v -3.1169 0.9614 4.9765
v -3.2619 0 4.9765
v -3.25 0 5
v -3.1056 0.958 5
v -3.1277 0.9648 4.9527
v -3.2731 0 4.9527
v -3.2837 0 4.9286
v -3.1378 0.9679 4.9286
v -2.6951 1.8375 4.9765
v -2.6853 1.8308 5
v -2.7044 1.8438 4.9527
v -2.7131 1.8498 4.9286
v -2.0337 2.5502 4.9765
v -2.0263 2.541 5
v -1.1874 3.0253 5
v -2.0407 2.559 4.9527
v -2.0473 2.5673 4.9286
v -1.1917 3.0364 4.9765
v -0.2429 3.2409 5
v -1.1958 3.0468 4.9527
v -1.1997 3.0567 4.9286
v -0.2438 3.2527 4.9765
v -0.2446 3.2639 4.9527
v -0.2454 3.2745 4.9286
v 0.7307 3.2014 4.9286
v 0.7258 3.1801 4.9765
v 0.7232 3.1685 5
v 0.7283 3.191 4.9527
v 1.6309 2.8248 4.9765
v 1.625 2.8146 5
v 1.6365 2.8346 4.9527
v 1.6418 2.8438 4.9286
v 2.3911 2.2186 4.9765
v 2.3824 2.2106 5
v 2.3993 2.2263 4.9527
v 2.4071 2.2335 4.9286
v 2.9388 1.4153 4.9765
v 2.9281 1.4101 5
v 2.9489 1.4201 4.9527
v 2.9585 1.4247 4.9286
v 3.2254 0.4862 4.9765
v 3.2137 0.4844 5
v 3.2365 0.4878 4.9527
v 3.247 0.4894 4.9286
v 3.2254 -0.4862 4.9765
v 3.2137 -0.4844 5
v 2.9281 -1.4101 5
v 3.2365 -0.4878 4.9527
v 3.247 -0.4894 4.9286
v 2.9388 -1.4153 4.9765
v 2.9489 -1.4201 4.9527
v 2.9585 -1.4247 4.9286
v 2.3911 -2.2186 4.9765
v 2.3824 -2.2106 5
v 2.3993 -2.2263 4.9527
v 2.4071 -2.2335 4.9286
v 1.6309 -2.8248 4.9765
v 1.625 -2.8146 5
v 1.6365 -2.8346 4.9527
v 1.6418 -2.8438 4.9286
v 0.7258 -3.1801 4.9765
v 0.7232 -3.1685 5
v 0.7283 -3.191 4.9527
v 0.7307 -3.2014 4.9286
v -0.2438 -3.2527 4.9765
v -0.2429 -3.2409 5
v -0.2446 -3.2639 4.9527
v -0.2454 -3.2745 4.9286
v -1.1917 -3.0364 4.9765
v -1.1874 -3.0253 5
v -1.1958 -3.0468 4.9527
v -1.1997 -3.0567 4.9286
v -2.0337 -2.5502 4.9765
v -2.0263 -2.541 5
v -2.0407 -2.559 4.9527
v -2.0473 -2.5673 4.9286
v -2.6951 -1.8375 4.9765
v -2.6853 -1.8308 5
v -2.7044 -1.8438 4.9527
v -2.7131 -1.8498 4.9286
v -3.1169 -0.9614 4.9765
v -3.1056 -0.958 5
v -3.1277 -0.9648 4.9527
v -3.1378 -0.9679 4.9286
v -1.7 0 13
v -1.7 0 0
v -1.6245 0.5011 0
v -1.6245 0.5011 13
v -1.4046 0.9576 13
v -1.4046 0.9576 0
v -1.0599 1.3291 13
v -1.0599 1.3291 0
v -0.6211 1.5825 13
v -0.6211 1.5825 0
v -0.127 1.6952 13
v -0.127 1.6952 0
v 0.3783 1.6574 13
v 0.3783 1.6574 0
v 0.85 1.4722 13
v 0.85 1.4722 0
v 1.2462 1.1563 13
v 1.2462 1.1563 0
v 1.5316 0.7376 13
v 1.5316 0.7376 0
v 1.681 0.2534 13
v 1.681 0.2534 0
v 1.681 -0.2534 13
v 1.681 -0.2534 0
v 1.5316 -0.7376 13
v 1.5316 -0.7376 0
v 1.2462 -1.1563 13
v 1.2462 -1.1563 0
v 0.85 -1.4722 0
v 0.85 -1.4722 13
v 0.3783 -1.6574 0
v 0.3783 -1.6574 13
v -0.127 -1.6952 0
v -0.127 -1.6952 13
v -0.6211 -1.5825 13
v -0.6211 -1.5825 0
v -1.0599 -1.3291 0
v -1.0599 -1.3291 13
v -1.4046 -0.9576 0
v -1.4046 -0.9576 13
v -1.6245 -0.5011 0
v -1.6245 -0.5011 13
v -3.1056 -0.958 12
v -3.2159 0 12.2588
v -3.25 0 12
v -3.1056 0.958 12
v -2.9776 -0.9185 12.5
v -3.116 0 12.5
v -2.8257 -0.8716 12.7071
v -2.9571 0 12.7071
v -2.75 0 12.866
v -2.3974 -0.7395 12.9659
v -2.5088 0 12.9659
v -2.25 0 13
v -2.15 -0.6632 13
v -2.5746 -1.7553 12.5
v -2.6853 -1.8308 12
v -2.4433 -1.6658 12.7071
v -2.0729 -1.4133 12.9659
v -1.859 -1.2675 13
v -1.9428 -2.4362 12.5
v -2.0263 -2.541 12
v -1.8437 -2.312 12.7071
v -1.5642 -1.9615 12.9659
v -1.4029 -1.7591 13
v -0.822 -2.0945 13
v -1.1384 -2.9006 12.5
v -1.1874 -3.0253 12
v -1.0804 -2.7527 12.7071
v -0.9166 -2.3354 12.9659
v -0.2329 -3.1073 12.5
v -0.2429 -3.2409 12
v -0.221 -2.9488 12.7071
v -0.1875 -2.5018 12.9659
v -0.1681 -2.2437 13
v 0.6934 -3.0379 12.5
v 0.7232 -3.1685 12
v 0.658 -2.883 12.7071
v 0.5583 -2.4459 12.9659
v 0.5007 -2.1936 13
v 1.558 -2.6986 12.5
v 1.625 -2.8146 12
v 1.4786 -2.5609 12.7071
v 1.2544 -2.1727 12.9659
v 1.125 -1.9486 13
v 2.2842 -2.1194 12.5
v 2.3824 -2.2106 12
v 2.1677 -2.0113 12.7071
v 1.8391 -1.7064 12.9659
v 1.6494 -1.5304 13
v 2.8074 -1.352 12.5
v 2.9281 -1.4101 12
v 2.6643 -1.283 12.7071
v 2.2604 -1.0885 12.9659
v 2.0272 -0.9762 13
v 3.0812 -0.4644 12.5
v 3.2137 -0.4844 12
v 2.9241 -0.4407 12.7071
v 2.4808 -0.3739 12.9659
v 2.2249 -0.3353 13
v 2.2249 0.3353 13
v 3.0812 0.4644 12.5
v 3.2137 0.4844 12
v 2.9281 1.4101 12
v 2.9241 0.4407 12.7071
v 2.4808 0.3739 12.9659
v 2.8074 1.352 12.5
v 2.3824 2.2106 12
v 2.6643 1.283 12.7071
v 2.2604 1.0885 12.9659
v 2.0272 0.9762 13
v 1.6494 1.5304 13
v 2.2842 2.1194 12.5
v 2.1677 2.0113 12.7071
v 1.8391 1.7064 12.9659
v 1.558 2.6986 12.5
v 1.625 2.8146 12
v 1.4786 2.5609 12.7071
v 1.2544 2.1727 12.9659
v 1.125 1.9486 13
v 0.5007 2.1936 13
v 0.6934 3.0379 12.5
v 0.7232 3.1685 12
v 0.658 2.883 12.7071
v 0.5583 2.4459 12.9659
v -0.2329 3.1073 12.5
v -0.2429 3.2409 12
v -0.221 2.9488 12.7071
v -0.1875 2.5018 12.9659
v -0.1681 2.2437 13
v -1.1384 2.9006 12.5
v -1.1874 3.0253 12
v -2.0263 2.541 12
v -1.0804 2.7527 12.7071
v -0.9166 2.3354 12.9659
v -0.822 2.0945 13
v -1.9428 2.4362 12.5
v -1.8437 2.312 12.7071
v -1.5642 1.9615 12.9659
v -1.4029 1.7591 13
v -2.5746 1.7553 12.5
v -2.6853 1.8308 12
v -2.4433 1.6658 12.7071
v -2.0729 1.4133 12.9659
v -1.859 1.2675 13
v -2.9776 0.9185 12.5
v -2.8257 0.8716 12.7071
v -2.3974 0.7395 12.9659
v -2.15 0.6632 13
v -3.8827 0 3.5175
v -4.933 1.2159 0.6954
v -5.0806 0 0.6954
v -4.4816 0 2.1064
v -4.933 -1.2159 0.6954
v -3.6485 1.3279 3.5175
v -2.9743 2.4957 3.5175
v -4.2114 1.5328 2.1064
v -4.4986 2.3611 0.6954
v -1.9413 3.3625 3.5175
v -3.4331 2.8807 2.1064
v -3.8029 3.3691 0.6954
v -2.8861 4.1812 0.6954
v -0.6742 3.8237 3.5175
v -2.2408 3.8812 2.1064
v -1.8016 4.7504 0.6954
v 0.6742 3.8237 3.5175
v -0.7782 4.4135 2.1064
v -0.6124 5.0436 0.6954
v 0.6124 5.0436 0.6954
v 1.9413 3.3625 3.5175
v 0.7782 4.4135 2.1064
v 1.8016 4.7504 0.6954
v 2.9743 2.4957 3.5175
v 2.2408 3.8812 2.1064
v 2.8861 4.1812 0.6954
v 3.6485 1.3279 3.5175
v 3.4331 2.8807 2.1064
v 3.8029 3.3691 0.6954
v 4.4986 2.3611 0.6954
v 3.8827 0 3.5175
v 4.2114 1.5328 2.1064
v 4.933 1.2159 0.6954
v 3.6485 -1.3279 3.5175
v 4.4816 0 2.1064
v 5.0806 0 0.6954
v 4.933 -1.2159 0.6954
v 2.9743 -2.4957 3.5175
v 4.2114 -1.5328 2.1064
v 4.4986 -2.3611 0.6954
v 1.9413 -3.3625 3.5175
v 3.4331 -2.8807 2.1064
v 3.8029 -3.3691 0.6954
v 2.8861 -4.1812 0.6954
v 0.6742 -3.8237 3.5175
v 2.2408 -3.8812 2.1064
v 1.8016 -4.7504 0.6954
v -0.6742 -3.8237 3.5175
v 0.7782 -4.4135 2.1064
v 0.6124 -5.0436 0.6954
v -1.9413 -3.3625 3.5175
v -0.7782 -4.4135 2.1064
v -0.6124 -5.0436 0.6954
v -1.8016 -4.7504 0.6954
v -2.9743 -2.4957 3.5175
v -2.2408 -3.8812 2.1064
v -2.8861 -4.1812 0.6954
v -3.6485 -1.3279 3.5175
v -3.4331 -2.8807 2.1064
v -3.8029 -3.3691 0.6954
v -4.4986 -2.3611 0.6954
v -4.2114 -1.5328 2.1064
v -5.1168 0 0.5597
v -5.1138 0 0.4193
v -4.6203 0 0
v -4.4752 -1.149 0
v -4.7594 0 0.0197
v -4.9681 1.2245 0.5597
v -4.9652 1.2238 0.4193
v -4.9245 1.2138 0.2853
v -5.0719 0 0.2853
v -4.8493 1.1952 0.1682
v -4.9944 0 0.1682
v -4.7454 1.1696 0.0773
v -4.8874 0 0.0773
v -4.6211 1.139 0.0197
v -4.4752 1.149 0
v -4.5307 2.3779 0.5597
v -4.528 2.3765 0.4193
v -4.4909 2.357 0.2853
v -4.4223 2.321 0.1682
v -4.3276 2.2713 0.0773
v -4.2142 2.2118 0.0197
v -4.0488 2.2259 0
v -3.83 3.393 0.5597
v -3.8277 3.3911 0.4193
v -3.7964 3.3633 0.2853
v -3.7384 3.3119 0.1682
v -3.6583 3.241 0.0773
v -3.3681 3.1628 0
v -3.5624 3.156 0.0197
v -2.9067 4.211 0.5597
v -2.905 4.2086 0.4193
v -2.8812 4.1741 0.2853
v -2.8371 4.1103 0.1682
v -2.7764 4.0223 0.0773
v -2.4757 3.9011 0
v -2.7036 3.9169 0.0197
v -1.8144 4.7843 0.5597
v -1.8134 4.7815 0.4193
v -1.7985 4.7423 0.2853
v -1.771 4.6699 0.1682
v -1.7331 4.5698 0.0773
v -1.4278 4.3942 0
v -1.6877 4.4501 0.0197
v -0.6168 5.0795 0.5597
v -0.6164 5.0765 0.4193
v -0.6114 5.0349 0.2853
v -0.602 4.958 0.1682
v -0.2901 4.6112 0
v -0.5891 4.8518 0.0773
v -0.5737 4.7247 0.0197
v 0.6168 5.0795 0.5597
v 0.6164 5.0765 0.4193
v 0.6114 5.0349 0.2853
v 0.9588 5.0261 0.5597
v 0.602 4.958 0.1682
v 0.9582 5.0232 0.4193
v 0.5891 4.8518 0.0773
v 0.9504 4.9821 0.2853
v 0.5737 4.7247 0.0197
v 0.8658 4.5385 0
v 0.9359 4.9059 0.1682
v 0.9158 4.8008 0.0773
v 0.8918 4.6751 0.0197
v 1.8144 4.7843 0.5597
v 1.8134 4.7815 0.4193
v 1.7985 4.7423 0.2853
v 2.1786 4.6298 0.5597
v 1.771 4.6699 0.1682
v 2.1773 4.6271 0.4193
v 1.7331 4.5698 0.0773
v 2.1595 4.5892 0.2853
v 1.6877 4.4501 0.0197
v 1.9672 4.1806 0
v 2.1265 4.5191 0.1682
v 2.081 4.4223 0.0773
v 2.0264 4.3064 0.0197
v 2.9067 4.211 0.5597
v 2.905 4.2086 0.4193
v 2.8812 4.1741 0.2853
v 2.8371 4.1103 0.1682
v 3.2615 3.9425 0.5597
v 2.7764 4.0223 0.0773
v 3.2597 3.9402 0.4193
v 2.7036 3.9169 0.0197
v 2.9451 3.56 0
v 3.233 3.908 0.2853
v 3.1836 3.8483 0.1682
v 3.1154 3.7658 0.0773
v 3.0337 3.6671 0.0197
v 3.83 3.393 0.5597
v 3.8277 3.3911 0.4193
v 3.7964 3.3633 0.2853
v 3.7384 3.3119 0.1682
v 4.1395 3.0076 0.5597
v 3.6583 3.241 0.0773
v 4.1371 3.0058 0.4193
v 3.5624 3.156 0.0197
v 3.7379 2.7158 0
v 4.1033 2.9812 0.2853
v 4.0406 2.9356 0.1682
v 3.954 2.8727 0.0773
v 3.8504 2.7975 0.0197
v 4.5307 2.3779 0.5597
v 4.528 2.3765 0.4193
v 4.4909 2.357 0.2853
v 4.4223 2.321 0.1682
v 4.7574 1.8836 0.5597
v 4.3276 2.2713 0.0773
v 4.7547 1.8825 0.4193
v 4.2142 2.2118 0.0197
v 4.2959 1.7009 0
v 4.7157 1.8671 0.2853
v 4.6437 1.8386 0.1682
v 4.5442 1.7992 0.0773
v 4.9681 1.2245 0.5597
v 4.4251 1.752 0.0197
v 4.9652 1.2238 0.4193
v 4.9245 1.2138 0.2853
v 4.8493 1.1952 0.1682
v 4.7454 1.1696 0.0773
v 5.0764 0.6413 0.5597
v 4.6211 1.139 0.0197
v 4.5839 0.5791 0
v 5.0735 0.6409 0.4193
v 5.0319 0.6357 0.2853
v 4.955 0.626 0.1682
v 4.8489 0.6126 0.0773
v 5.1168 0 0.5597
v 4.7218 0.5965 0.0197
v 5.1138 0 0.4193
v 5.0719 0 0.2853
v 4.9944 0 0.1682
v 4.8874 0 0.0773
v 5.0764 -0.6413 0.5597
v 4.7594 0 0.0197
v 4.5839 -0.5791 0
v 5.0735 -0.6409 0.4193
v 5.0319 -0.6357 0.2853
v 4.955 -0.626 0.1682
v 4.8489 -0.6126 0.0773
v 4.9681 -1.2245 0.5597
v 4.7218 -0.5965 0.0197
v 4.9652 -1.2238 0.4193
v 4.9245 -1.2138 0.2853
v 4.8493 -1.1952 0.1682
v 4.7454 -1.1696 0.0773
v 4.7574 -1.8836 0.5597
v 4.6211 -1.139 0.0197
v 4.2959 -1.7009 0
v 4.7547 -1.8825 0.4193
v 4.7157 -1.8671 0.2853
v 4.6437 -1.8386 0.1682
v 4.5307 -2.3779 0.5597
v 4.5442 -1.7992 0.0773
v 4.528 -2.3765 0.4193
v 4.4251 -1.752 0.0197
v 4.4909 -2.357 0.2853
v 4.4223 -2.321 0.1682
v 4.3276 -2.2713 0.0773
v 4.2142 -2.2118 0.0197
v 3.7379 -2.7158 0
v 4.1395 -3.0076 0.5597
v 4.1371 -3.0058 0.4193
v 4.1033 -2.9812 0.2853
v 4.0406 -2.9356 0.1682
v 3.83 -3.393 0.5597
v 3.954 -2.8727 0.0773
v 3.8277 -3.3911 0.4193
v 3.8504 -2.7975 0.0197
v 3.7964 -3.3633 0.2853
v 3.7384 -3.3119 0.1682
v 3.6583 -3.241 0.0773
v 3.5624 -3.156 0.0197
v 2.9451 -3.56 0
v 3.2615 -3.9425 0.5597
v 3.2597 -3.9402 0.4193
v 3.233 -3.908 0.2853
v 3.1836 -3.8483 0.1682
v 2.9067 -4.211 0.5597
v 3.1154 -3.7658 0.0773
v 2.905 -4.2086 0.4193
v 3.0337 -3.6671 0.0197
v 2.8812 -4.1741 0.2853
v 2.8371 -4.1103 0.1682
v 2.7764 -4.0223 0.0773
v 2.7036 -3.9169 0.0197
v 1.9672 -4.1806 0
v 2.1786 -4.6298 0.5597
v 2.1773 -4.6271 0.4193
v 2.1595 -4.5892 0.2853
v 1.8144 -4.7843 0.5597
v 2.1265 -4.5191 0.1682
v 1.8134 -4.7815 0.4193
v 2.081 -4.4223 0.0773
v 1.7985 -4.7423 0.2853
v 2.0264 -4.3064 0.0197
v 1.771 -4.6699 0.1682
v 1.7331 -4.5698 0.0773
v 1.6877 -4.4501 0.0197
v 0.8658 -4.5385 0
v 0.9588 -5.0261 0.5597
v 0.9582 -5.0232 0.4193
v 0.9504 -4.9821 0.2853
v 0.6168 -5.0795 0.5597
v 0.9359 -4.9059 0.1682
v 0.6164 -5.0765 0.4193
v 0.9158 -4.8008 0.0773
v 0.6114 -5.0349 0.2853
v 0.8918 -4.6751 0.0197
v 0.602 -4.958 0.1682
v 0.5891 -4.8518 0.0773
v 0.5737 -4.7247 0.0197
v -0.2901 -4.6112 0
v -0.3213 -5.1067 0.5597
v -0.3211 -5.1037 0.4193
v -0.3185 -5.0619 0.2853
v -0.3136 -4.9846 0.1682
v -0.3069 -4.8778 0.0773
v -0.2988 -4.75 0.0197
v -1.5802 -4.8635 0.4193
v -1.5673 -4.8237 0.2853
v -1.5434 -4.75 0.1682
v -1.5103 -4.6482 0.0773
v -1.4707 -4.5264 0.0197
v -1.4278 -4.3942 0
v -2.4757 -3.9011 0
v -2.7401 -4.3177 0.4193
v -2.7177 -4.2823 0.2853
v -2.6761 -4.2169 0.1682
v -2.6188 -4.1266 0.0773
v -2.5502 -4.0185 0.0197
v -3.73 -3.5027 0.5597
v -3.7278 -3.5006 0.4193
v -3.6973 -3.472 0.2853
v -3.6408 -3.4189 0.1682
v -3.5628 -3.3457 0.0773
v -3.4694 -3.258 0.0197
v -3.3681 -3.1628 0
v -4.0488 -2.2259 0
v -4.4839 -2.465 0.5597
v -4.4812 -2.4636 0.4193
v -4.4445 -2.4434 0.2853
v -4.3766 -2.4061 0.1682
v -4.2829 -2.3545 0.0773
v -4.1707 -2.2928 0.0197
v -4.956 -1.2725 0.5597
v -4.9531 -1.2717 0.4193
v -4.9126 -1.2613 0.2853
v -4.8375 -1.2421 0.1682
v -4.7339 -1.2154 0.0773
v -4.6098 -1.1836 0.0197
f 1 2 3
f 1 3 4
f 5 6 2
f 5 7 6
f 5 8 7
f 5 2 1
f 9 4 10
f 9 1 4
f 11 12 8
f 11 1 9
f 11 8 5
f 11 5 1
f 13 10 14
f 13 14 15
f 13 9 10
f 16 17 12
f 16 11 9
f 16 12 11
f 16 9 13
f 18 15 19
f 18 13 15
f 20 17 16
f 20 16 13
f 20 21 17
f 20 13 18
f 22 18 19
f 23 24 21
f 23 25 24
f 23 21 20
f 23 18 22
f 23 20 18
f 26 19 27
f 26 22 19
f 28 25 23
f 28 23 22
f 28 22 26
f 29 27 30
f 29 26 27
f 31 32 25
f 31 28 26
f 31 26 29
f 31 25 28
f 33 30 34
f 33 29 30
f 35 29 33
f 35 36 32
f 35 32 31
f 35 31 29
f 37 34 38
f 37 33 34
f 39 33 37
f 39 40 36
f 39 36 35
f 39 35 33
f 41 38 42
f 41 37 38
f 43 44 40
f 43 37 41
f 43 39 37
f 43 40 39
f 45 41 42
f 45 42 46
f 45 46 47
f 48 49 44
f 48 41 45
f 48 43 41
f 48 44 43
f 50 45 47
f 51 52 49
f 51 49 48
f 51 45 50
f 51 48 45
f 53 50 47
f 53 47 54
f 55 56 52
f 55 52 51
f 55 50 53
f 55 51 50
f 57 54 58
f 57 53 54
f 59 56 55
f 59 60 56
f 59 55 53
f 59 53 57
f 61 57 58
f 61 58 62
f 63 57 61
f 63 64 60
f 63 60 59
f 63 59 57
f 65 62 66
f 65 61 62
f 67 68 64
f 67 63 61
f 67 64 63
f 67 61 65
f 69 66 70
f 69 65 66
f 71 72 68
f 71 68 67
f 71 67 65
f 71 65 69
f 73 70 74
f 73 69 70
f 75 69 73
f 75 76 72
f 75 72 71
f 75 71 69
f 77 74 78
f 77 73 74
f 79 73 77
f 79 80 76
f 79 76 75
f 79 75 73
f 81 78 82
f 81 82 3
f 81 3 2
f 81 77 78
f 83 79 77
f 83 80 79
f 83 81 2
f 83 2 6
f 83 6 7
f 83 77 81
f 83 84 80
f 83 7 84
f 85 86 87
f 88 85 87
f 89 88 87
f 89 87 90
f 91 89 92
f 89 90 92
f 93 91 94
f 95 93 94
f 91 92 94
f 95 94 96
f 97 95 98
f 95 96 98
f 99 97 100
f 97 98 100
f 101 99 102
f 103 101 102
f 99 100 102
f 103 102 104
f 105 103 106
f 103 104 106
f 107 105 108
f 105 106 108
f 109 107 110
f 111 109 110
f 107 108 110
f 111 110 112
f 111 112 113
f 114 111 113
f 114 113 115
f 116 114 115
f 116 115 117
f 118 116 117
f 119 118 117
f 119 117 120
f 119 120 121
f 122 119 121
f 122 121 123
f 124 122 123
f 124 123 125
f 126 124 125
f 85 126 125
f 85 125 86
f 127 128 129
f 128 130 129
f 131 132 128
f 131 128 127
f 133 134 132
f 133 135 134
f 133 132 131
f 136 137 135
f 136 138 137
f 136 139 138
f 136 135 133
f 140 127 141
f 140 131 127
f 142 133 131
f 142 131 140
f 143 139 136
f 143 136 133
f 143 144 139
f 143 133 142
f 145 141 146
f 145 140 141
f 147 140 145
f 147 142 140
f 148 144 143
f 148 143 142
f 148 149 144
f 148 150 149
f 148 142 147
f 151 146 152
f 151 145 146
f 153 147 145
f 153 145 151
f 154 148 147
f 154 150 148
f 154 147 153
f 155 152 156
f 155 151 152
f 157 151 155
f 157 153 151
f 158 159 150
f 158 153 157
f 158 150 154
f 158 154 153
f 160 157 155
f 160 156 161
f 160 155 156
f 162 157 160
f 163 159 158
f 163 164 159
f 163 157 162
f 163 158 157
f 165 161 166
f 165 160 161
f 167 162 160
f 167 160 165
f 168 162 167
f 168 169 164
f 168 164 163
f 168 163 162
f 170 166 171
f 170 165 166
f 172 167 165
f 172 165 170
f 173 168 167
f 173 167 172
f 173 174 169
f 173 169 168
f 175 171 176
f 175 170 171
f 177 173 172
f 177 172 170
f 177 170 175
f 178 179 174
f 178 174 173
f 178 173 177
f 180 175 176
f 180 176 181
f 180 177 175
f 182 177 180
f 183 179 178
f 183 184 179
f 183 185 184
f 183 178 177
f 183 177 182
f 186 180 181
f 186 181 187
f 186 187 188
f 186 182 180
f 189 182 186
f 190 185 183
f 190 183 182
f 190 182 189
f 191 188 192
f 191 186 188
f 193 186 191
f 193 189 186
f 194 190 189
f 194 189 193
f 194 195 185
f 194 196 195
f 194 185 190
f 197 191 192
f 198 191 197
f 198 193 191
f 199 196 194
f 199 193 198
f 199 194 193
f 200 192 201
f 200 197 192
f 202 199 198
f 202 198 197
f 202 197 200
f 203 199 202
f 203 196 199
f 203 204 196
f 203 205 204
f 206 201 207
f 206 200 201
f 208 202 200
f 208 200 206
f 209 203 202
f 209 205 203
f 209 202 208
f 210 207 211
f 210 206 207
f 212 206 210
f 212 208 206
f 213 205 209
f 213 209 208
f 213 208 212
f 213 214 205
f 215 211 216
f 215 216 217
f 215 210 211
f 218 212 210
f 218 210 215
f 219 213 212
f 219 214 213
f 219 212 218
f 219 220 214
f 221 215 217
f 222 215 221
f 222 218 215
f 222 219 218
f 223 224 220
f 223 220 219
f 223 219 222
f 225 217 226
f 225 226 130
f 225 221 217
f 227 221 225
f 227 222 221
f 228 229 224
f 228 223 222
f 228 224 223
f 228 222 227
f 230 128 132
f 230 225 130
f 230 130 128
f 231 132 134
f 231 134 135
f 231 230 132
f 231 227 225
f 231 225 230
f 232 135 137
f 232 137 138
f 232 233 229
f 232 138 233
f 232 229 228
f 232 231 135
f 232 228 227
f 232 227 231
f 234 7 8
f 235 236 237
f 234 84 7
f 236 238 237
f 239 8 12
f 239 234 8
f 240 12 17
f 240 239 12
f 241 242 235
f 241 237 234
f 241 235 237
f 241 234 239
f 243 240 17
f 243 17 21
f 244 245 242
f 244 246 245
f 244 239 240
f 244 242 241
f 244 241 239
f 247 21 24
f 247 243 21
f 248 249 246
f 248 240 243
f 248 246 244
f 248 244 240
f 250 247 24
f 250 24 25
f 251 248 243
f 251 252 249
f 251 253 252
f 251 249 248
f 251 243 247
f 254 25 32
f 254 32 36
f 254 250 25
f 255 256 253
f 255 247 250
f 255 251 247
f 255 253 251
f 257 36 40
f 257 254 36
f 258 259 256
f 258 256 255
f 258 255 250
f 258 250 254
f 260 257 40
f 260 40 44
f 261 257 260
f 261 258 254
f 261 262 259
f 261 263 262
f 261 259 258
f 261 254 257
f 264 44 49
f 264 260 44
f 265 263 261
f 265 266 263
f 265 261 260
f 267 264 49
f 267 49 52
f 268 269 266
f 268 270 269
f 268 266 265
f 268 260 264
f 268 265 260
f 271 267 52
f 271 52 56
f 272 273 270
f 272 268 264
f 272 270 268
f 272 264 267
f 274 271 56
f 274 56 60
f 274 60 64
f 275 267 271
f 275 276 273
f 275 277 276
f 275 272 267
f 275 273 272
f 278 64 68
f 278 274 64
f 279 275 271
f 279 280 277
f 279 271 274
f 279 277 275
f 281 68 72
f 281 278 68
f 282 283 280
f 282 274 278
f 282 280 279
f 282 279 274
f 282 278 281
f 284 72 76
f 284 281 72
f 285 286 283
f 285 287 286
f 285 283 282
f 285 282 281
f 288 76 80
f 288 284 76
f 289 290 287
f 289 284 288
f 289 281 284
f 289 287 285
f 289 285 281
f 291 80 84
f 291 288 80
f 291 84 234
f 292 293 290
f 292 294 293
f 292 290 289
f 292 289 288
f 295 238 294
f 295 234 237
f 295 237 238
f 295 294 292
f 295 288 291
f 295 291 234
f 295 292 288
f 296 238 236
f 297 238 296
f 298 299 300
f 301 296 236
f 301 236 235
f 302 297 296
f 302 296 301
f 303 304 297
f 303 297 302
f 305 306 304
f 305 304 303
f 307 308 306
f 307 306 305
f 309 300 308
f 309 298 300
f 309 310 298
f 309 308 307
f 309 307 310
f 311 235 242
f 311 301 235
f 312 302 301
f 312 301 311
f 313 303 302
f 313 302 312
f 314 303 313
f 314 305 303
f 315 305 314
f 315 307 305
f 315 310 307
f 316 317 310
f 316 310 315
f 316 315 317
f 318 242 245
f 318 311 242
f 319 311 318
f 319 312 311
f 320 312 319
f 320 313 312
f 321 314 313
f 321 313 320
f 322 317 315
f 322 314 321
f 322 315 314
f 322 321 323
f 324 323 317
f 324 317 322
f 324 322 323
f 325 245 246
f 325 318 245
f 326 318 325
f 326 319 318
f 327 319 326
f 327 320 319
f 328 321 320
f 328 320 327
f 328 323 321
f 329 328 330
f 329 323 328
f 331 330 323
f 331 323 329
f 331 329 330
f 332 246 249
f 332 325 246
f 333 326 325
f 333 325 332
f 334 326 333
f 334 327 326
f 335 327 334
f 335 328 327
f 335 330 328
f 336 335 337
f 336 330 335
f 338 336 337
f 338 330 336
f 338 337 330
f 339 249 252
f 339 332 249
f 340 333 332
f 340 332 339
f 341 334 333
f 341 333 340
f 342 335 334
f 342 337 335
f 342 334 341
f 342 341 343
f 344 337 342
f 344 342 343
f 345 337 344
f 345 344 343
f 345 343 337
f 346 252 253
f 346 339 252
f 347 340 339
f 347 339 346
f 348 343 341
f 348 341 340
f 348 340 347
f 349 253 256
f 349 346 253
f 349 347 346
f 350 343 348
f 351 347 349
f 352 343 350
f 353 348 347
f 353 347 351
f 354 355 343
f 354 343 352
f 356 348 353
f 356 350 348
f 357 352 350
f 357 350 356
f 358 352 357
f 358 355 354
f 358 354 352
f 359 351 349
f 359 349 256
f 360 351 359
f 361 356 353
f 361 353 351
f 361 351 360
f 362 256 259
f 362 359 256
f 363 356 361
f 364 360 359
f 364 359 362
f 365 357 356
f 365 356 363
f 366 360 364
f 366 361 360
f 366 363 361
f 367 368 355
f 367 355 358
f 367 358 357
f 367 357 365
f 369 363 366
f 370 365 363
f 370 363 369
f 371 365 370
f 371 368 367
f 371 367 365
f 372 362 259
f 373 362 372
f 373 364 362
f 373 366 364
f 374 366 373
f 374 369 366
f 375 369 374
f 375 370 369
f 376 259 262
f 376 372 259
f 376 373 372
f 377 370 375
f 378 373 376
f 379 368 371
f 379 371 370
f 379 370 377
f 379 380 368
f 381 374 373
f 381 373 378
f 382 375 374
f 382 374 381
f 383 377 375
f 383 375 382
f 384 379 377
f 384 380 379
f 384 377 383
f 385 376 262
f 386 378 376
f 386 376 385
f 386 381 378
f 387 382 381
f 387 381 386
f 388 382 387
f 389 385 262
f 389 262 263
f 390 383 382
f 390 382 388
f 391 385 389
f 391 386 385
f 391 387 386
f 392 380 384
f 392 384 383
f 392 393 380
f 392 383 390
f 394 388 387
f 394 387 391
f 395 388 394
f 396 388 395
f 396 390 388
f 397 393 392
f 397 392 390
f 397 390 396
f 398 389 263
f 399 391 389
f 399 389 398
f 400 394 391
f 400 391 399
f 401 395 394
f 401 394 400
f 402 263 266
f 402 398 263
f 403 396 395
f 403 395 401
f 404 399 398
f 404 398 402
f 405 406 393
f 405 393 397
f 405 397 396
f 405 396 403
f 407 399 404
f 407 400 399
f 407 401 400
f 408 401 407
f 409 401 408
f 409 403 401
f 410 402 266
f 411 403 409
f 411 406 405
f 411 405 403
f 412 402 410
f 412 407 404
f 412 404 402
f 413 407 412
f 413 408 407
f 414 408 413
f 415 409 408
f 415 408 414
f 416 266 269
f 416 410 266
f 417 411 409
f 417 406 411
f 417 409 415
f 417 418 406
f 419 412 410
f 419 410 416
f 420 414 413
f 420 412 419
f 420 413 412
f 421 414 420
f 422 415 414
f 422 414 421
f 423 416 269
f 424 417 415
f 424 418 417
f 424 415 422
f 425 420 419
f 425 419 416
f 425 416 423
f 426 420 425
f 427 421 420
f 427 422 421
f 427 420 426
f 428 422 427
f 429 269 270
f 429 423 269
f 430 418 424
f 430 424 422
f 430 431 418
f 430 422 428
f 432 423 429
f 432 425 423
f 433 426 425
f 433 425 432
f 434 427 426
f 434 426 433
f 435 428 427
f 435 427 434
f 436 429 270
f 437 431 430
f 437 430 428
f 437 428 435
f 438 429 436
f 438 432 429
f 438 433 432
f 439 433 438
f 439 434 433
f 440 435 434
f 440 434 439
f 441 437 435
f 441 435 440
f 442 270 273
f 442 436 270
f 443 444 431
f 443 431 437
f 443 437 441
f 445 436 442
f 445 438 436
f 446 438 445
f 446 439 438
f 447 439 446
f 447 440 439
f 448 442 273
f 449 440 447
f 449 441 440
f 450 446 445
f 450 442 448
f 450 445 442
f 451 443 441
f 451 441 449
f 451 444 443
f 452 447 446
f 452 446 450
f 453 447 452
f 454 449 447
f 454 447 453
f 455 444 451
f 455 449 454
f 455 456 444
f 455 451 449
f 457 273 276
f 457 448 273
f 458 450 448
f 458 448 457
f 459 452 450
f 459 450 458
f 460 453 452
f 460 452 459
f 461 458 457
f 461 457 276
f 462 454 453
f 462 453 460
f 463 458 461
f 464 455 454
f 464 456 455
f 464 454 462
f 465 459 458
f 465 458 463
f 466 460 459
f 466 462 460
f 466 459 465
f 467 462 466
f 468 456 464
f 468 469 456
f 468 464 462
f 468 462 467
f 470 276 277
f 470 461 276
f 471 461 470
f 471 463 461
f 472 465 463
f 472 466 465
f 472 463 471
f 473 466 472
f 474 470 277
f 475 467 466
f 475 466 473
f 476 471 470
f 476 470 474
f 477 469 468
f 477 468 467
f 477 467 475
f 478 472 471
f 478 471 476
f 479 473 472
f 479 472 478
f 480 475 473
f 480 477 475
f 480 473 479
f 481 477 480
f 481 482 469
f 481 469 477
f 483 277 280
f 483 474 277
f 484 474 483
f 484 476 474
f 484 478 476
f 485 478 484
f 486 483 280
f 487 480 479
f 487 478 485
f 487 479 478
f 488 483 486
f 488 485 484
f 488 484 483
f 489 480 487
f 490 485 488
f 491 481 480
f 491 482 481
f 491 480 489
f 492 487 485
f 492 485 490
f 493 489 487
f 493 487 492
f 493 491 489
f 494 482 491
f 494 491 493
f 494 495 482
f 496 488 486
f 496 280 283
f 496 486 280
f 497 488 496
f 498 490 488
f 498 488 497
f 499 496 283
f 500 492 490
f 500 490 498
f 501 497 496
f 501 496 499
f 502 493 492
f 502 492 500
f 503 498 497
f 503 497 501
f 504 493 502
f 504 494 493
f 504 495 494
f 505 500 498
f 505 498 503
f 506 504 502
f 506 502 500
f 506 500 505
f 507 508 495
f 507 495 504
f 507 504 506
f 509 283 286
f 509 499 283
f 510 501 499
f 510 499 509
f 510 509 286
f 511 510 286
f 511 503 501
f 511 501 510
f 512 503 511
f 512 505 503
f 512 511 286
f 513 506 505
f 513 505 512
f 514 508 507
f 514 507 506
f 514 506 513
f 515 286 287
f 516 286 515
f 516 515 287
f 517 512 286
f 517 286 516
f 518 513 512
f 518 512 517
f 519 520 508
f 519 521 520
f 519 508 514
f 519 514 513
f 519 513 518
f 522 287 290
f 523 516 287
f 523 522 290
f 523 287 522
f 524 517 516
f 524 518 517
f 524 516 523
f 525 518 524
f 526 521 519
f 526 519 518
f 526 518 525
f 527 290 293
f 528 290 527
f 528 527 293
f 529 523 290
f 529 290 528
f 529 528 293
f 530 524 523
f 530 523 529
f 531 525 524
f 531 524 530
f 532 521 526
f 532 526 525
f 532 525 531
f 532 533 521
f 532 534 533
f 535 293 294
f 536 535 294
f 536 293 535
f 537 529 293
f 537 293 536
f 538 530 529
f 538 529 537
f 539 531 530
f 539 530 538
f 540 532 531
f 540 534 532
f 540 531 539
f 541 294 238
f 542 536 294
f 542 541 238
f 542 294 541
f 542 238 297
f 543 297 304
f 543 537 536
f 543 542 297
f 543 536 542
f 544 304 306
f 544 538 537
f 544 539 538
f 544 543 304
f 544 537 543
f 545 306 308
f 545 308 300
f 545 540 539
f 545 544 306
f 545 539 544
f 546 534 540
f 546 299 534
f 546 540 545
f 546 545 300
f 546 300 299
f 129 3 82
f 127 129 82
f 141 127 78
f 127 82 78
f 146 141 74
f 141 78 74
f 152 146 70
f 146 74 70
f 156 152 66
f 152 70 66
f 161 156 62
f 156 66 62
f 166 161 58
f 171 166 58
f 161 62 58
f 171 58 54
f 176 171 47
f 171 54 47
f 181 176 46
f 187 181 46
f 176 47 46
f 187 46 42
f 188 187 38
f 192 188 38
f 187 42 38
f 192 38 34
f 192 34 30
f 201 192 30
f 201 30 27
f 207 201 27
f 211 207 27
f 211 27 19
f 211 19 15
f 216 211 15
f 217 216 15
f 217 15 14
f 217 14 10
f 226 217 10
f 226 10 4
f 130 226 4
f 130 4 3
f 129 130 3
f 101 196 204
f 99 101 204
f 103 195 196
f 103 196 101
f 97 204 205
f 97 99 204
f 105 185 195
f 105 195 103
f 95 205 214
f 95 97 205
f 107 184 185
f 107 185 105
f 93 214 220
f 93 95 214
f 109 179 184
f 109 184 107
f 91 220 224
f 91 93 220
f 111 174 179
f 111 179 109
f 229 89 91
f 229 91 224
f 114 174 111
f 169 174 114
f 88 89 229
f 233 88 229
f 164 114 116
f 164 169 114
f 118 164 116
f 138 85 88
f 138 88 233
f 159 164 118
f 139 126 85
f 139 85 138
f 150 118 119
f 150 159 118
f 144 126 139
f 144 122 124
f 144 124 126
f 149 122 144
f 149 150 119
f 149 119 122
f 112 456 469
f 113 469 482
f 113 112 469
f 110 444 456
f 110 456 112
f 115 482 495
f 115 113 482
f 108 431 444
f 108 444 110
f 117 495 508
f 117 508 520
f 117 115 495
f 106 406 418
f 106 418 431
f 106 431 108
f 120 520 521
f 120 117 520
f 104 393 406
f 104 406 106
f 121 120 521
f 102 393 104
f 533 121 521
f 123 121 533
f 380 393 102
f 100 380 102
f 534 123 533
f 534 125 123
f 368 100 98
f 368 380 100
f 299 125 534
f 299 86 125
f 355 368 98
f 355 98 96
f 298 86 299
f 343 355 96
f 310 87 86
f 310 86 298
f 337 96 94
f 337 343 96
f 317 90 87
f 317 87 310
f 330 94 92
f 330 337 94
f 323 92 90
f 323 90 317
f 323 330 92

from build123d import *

# Parameters (mm, degrees)
SKETCH_1_R          = 3.25
EXTRUDE_1_DEPTH     = 13
SKETCH_2_R          = 5.375758968
EXTRUDE_2_DEPTH     = 5
EXTRUDE_2_DRAFT     = -23
SKETCH_3_R          = 1.7
CUT_EXTRUDE_1_DEPTH = 16.059799765
FILLET_1_R          = 1
FILLET_2_R          = 0.5
FILLET_3_R          = 1


with BuildPart() as part:
    # 草图1 → 凸台-拉伸1 (new body)
    with BuildSketch(Plane.XY):
        with Locations(Location((0, 0, 0), (0, 0, 180))):
            Circle(SKETCH_1_R)
    extrude(amount=EXTRUDE_1_DEPTH)


with BuildPart() as extrude_2_tool:
    # 草图2 → 凸台-拉伸2 (with draft: the straight prism first)
    with BuildSketch(Plane(origin=(0, 0, 0), x_dir=(-1, 0, 0), z_dir=(0, 0, -1))):
        Circle(SKETCH_2_R)
    extrude(amount=-EXTRUDE_2_DEPTH)
    # 凸台-拉伸2: the draft: its side faces are tilted about the plane it starts from
    extrude_2_sides = [extrude_2_tool.faces().sort_by_distance(p)[0] for p in [
        (5.375758968, 0, 2.5),
    ]]
    draft(extrude_2_sides, Plane(origin=(0, 0, 0), x_dir=(-1, 0, 0), z_dir=(0, 0, -1)), EXTRUDE_2_DRAFT)


with BuildPart() as part_1:
    add(part.part)

    # 凸台-拉伸2: add extrude_2_tool
    add(extrude_2_tool.part)

    # 草图3 → 切除-拉伸1 (cut, through all)
    with BuildSketch(Plane(origin=(0, 0, 0), x_dir=(-1, 0, 0), z_dir=(0, 0, -1))):
        Circle(SKETCH_3_R)
    extrude(amount=-CUT_EXTRUDE_1_DEPTH, mode=Mode.SUBTRACT)

    # 圆角1
    fillet_1_edges = [part_1.edges().sort_by_distance(p)[0] for p in [
        (3.25, 0, 13),
    ]]
    fillet(fillet_1_edges, radius=FILLET_1_R)

    # 圆角2
    fillet_2_edges = [part_1.edges().sort_by_distance(p)[0] for p in [
        (5.375758968, 0, 0),
    ]]
    fillet(fillet_2_edges, radius=FILLET_2_R)

    # 圆角3
    # the kernel refuses this fillet: 1 mm, written as the material it takes off along each edge
    with BuildSketch(Plane(origin=(0, 0, 5), x_dir=(-1, 0, 0), z_dir=(0, -1, 0))) as fillet_3_piece_1:
        with BuildLine():
            CenterArc((2.363183754, 0.46212222), FILLET_3_R, 332.475864529, 4.524135471)
            Line((3.25, 0), (3.253384887, 0))
            Line((3.253384887, 0), (3.283688608, 0.071391091))
        make_face()
    revolve(axis=Axis((0, 0, 5), (0, 0, -1)), mode=Mode.SUBTRACT)


solid = part_1.part
